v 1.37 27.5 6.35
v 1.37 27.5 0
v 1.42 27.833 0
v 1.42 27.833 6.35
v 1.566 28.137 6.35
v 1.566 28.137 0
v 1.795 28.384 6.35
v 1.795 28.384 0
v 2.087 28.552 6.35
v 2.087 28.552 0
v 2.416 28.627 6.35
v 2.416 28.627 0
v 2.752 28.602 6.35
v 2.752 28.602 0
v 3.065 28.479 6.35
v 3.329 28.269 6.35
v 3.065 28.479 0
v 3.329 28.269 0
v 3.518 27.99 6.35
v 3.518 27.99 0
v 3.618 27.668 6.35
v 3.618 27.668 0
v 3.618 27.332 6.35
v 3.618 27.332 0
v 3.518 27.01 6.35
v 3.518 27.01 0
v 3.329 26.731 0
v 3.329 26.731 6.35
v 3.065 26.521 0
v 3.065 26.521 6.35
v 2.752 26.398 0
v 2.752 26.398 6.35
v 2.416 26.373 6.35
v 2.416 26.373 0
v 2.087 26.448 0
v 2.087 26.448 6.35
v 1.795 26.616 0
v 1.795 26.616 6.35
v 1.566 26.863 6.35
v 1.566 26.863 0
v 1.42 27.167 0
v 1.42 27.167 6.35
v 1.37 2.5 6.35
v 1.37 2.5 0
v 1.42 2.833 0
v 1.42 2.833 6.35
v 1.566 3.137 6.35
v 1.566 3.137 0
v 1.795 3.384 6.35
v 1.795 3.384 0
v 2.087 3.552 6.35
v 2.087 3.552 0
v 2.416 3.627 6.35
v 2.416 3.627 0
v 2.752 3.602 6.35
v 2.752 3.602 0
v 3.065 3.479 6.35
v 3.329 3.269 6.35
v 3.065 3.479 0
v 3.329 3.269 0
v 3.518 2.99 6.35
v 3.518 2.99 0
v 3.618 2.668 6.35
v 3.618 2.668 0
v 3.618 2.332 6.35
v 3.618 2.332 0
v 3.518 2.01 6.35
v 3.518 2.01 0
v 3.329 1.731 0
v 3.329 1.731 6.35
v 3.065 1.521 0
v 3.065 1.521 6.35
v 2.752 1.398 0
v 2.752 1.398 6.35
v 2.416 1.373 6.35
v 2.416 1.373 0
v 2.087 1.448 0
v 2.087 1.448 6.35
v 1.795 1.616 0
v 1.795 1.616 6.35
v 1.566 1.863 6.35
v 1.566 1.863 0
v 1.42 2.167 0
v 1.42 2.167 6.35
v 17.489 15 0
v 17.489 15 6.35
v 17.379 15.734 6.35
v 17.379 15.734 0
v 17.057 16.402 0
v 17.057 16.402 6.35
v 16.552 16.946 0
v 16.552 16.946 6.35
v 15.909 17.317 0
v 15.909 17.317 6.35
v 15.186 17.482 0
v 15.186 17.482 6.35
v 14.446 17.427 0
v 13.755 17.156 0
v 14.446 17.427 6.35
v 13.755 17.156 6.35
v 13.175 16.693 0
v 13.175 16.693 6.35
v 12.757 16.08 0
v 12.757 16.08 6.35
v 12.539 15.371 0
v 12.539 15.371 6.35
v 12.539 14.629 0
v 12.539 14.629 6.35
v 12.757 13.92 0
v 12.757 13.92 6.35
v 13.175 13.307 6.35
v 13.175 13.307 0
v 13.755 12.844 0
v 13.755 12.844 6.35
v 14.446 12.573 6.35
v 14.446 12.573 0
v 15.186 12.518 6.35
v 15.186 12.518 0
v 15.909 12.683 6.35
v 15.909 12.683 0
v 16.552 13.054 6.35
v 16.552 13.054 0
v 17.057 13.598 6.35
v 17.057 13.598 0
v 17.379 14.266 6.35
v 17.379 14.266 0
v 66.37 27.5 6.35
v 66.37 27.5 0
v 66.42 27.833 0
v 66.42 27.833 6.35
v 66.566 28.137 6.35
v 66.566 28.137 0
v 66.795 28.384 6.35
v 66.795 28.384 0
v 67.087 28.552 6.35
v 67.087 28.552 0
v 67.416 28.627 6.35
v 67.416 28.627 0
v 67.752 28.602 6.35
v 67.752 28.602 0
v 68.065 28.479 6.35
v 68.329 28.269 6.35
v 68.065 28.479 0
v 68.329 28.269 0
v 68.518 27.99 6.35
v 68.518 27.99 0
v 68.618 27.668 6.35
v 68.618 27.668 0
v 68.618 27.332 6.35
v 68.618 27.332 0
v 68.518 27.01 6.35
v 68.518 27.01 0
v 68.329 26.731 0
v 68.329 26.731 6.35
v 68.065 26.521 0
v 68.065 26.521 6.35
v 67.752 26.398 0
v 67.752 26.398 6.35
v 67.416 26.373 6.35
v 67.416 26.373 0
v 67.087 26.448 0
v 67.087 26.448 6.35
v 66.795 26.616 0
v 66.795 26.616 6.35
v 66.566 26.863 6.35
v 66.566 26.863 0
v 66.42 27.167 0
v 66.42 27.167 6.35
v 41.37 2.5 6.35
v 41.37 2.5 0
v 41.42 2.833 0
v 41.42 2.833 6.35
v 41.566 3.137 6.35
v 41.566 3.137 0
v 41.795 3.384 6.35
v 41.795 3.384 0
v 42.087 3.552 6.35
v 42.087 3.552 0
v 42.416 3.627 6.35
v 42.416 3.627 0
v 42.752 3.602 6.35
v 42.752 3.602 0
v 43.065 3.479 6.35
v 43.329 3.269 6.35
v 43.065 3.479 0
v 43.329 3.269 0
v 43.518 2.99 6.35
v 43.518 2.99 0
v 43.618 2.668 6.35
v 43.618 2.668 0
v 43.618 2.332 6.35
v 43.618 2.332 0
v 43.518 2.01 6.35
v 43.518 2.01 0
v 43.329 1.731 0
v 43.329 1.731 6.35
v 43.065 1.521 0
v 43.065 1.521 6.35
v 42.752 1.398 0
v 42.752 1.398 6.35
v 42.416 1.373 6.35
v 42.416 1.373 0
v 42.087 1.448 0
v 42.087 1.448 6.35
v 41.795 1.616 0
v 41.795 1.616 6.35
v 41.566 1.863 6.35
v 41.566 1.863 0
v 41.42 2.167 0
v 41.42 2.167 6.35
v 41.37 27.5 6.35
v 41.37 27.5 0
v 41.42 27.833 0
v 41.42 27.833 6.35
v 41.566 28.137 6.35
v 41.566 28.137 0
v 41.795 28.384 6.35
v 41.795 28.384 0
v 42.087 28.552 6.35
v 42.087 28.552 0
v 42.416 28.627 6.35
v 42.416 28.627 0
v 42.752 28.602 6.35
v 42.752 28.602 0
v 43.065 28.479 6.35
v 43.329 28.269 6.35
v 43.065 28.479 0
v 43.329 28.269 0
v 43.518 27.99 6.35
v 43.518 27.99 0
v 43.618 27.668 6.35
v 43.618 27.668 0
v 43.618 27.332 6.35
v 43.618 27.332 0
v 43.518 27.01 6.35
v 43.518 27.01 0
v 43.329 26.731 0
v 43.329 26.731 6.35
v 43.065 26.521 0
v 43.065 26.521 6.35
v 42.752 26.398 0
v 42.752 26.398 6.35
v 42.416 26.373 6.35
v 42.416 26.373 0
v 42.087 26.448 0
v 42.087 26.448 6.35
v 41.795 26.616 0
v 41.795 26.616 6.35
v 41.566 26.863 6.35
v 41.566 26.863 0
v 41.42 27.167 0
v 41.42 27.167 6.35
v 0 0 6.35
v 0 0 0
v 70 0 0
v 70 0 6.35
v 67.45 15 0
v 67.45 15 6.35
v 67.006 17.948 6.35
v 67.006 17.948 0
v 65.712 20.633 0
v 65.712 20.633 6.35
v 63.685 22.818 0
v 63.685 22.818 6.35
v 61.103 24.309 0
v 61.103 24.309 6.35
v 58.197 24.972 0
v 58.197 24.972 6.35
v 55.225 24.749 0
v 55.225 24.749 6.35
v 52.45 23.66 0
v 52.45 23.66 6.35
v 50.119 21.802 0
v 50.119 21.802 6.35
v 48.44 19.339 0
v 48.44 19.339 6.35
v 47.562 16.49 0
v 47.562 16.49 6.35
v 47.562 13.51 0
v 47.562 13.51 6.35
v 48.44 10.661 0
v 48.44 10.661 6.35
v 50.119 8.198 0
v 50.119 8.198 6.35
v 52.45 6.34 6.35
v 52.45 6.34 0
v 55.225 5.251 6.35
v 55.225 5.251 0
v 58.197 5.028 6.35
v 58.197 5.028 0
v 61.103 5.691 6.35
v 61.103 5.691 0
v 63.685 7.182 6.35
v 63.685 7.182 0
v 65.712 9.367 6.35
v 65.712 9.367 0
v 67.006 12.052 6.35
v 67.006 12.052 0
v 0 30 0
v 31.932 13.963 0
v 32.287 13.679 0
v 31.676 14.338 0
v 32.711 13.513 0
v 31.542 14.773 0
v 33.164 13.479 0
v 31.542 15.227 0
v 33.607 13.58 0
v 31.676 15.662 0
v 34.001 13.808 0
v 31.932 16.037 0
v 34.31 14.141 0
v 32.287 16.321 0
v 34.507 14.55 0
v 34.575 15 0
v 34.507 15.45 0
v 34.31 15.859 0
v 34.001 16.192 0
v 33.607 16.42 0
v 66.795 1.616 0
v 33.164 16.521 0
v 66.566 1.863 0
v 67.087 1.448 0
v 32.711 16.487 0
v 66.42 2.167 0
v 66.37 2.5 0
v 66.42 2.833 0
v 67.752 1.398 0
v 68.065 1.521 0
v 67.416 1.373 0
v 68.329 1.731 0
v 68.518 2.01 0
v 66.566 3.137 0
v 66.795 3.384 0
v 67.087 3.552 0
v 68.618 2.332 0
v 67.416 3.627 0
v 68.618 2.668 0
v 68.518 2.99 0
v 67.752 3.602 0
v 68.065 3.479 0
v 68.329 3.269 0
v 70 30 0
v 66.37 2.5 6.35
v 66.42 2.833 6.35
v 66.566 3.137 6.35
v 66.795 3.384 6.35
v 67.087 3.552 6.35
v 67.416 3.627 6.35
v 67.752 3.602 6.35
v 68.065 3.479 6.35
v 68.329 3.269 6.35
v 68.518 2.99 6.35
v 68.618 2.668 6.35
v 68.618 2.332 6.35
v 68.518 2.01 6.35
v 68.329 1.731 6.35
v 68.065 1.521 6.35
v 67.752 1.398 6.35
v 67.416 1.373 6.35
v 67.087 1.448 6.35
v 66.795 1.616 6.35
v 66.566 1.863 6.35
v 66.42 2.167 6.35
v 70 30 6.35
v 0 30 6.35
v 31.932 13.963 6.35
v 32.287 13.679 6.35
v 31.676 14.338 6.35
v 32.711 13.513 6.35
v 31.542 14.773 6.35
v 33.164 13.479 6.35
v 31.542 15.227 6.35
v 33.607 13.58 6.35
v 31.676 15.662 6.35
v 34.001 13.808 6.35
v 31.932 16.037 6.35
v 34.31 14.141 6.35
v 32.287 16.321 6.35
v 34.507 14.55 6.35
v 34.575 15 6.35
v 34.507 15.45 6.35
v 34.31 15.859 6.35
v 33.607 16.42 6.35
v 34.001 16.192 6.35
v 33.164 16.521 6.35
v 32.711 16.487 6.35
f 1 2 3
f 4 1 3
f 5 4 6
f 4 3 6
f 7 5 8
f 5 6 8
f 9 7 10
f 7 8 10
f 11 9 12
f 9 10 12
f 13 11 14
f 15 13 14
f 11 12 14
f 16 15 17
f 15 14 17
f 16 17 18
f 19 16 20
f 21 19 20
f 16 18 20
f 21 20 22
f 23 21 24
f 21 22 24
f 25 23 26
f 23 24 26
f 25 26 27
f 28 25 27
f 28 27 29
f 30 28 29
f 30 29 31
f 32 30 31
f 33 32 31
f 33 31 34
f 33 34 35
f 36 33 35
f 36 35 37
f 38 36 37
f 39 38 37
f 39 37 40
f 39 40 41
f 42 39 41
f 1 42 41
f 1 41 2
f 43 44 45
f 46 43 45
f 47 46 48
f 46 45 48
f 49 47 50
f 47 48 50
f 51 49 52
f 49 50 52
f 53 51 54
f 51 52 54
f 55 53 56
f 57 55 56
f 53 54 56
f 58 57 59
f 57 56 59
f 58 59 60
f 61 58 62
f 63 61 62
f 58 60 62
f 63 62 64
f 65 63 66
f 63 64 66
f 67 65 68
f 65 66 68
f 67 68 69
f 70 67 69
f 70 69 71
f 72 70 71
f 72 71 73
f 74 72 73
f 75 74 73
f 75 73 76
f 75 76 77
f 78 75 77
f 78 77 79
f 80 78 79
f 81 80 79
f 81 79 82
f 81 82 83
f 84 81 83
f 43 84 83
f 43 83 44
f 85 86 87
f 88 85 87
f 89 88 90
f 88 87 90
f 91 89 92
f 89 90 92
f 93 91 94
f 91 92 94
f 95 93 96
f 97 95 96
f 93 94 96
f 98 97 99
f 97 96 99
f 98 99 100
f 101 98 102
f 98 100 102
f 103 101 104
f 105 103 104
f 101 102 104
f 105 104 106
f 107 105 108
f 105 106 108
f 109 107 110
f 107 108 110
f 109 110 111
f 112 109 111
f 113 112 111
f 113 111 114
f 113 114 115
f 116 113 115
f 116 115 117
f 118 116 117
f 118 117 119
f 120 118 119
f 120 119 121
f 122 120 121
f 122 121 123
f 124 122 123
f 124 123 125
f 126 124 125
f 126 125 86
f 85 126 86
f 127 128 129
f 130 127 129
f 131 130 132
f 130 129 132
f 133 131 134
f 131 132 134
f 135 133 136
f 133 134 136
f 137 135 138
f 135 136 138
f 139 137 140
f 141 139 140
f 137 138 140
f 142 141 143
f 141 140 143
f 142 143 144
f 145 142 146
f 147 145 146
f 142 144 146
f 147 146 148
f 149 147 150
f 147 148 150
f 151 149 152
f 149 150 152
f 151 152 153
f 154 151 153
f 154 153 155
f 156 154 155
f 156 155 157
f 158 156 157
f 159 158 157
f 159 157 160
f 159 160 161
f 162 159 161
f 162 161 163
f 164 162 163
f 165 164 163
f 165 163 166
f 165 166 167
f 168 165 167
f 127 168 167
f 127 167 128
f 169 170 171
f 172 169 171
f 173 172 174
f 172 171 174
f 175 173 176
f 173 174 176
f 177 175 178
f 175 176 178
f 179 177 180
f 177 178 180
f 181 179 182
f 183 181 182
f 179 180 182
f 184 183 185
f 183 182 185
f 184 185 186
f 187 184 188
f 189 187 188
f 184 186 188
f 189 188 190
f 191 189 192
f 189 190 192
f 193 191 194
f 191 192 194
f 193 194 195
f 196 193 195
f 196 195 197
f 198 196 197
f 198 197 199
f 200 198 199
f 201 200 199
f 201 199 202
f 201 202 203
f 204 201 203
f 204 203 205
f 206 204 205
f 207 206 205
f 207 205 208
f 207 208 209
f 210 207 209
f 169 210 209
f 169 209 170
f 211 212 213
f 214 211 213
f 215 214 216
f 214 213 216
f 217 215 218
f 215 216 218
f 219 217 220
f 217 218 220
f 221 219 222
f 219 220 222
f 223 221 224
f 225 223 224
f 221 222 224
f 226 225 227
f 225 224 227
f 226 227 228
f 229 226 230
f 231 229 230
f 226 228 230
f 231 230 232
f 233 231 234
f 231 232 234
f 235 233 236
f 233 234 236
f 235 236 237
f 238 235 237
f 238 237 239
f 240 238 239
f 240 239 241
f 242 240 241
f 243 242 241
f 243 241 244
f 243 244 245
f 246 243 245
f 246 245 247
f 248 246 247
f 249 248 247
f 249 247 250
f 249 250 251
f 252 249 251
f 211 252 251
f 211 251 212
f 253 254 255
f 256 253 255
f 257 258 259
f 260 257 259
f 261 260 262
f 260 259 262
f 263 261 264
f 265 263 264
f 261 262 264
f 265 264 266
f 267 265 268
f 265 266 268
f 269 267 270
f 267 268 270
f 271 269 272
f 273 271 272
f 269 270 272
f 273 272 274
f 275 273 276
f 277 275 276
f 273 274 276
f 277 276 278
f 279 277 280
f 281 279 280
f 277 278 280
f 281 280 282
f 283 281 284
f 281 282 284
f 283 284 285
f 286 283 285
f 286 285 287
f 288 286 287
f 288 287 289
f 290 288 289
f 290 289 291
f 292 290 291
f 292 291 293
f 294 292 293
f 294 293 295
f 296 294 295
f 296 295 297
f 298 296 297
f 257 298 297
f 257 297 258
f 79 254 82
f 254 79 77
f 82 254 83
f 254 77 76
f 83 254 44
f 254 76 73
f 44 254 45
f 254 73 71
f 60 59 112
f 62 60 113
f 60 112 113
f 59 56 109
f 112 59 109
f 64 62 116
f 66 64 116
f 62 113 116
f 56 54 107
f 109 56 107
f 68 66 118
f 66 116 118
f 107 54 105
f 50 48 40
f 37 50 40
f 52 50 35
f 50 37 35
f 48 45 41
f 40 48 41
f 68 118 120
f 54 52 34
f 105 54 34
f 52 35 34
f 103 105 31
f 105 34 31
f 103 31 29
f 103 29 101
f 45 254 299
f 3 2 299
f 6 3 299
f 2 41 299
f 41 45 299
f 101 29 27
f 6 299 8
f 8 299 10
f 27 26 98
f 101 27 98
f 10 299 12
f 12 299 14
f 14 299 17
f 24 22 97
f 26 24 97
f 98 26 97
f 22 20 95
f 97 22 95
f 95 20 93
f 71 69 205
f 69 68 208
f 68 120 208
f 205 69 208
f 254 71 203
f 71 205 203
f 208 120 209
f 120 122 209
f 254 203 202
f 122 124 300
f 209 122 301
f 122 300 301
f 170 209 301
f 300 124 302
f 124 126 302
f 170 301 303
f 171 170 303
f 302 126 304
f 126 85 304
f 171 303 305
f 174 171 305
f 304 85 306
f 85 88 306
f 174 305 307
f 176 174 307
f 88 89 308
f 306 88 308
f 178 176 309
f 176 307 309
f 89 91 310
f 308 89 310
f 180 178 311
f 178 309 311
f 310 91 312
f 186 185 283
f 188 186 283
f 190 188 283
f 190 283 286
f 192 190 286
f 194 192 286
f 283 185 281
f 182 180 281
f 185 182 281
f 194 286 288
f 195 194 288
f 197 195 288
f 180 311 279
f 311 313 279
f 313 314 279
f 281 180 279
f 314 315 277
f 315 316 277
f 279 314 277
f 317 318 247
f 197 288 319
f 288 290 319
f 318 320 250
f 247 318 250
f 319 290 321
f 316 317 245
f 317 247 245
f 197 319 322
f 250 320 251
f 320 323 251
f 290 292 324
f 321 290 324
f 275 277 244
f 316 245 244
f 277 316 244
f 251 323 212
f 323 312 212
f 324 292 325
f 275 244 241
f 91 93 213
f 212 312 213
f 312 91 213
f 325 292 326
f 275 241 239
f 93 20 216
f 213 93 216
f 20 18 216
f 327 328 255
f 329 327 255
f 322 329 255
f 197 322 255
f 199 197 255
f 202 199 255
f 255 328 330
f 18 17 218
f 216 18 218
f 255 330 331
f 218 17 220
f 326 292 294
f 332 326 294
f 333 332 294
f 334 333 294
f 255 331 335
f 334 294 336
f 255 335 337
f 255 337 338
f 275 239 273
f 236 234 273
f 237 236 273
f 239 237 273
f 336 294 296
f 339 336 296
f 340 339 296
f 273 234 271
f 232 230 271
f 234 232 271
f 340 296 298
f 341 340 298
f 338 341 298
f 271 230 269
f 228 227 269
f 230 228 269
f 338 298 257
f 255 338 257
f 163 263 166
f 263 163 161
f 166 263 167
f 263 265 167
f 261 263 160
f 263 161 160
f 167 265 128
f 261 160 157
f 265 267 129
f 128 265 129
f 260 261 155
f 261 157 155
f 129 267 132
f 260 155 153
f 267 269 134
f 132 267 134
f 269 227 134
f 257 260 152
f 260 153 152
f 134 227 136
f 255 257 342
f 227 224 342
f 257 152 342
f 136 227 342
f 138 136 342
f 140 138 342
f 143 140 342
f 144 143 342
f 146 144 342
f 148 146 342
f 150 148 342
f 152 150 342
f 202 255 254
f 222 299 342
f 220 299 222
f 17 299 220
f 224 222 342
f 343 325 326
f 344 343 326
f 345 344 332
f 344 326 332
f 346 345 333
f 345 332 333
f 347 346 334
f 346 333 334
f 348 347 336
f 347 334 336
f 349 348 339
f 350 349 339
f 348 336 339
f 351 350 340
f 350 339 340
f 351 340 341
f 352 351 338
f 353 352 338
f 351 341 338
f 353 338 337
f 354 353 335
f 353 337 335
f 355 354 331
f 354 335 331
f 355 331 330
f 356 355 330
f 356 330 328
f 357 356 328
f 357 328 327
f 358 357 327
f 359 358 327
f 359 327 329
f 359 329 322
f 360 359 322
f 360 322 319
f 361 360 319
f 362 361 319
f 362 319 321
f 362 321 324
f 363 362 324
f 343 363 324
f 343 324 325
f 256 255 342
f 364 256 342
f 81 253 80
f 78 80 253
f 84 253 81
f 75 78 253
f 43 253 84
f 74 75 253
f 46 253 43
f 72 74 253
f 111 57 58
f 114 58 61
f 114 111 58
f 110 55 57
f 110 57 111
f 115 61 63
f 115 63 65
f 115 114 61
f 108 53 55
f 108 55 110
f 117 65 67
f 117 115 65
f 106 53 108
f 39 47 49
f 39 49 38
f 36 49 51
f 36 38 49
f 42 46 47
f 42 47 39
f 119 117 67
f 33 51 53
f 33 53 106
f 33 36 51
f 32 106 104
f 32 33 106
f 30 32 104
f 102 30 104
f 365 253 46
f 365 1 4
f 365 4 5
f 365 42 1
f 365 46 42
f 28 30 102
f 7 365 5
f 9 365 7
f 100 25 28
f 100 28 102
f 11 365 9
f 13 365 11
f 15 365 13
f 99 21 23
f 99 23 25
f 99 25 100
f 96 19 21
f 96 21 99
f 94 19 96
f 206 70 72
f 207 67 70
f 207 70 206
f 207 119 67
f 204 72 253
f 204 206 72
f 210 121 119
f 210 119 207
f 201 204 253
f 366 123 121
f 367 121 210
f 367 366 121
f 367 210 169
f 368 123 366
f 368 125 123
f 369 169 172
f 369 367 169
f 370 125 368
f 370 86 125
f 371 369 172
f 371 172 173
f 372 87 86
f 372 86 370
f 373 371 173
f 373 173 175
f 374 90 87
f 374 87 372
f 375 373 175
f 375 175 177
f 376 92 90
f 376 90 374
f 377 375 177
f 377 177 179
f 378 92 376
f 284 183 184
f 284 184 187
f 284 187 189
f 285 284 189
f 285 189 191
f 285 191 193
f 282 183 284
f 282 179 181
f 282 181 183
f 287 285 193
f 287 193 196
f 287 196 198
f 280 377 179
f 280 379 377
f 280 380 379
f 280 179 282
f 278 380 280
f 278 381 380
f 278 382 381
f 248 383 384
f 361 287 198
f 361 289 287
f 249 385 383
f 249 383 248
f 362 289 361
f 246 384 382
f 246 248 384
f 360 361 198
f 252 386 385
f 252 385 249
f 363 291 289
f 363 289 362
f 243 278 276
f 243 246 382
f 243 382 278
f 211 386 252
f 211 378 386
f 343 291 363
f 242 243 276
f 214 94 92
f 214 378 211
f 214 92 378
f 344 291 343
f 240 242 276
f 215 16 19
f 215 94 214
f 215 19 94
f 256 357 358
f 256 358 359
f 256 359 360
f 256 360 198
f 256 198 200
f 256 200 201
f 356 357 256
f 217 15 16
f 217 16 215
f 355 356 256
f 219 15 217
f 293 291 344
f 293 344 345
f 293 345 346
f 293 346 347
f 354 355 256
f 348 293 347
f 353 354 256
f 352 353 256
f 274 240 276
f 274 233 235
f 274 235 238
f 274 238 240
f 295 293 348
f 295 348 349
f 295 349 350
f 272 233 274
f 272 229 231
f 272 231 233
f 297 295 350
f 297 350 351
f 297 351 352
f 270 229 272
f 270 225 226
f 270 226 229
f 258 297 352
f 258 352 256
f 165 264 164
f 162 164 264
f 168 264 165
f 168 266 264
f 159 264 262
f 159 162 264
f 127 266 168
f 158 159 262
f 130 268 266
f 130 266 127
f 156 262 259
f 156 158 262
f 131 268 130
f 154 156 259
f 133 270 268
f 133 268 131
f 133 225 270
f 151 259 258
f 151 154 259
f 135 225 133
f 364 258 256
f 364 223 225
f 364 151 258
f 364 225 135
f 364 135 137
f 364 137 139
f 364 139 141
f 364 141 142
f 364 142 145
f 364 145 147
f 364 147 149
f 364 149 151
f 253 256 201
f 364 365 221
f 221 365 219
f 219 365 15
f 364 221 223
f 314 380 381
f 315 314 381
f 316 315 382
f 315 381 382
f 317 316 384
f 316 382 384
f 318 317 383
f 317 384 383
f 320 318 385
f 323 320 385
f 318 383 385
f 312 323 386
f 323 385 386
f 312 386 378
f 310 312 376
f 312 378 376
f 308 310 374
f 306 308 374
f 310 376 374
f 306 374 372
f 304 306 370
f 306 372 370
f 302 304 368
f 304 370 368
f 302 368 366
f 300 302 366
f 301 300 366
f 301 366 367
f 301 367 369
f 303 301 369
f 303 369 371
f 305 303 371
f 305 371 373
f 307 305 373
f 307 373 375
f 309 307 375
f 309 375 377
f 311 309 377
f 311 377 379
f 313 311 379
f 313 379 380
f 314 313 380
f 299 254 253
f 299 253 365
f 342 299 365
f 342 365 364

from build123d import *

# Parameters (mm, degrees)
SKETCH1_W             = 70
SKETCH1_H             = 30
BOSS_EXTRUDE1_DEPTH   = 6.35
F_2_CLEARANCE_HOLE1_D = 2.2606
SKETCH4_R             = 10
SKETCH4_R_2           = 2.4892
SKETCH4_R_3           = 1.525
CUT_EXTRUDE1_DEPTH    = 77.422002722


with BuildPart() as part:
    # Sketch1 → Boss-Extrude1 (new body)
    with BuildSketch(Plane.XY):
        with Locations((35, 15)):
            Rectangle(SKETCH1_W, SKETCH1_H)
    extrude(amount=BOSS_EXTRUDE1_DEPTH)

    # #2 Clearance Hole1 (through all)
    with Locations(Plane.XY.offset(6.35)):
        with Locations((2.5, 27.5), (42.5, 27.5), (67.5, 27.5), (67.5, 2.5), (42.5, 2.5), (2.5, 2.5)):
            Hole(F_2_CLEARANCE_HOLE1_D / 2)

    # Sketch4 → Cut-Extrude1 (cut, through all)
    with BuildSketch(Plane.XY.offset(6.35)):
        with Locations((57.45, 15)):
            Circle(SKETCH4_R)
        with Locations((15, 15)):
            Circle(SKETCH4_R_2)
        with Locations((33.05, 15)):
            Circle(SKETCH4_R_3)
    extrude(amount=-CUT_EXTRUDE1_DEPTH, mode=Mode.SUBTRACT)


solid = part.part
